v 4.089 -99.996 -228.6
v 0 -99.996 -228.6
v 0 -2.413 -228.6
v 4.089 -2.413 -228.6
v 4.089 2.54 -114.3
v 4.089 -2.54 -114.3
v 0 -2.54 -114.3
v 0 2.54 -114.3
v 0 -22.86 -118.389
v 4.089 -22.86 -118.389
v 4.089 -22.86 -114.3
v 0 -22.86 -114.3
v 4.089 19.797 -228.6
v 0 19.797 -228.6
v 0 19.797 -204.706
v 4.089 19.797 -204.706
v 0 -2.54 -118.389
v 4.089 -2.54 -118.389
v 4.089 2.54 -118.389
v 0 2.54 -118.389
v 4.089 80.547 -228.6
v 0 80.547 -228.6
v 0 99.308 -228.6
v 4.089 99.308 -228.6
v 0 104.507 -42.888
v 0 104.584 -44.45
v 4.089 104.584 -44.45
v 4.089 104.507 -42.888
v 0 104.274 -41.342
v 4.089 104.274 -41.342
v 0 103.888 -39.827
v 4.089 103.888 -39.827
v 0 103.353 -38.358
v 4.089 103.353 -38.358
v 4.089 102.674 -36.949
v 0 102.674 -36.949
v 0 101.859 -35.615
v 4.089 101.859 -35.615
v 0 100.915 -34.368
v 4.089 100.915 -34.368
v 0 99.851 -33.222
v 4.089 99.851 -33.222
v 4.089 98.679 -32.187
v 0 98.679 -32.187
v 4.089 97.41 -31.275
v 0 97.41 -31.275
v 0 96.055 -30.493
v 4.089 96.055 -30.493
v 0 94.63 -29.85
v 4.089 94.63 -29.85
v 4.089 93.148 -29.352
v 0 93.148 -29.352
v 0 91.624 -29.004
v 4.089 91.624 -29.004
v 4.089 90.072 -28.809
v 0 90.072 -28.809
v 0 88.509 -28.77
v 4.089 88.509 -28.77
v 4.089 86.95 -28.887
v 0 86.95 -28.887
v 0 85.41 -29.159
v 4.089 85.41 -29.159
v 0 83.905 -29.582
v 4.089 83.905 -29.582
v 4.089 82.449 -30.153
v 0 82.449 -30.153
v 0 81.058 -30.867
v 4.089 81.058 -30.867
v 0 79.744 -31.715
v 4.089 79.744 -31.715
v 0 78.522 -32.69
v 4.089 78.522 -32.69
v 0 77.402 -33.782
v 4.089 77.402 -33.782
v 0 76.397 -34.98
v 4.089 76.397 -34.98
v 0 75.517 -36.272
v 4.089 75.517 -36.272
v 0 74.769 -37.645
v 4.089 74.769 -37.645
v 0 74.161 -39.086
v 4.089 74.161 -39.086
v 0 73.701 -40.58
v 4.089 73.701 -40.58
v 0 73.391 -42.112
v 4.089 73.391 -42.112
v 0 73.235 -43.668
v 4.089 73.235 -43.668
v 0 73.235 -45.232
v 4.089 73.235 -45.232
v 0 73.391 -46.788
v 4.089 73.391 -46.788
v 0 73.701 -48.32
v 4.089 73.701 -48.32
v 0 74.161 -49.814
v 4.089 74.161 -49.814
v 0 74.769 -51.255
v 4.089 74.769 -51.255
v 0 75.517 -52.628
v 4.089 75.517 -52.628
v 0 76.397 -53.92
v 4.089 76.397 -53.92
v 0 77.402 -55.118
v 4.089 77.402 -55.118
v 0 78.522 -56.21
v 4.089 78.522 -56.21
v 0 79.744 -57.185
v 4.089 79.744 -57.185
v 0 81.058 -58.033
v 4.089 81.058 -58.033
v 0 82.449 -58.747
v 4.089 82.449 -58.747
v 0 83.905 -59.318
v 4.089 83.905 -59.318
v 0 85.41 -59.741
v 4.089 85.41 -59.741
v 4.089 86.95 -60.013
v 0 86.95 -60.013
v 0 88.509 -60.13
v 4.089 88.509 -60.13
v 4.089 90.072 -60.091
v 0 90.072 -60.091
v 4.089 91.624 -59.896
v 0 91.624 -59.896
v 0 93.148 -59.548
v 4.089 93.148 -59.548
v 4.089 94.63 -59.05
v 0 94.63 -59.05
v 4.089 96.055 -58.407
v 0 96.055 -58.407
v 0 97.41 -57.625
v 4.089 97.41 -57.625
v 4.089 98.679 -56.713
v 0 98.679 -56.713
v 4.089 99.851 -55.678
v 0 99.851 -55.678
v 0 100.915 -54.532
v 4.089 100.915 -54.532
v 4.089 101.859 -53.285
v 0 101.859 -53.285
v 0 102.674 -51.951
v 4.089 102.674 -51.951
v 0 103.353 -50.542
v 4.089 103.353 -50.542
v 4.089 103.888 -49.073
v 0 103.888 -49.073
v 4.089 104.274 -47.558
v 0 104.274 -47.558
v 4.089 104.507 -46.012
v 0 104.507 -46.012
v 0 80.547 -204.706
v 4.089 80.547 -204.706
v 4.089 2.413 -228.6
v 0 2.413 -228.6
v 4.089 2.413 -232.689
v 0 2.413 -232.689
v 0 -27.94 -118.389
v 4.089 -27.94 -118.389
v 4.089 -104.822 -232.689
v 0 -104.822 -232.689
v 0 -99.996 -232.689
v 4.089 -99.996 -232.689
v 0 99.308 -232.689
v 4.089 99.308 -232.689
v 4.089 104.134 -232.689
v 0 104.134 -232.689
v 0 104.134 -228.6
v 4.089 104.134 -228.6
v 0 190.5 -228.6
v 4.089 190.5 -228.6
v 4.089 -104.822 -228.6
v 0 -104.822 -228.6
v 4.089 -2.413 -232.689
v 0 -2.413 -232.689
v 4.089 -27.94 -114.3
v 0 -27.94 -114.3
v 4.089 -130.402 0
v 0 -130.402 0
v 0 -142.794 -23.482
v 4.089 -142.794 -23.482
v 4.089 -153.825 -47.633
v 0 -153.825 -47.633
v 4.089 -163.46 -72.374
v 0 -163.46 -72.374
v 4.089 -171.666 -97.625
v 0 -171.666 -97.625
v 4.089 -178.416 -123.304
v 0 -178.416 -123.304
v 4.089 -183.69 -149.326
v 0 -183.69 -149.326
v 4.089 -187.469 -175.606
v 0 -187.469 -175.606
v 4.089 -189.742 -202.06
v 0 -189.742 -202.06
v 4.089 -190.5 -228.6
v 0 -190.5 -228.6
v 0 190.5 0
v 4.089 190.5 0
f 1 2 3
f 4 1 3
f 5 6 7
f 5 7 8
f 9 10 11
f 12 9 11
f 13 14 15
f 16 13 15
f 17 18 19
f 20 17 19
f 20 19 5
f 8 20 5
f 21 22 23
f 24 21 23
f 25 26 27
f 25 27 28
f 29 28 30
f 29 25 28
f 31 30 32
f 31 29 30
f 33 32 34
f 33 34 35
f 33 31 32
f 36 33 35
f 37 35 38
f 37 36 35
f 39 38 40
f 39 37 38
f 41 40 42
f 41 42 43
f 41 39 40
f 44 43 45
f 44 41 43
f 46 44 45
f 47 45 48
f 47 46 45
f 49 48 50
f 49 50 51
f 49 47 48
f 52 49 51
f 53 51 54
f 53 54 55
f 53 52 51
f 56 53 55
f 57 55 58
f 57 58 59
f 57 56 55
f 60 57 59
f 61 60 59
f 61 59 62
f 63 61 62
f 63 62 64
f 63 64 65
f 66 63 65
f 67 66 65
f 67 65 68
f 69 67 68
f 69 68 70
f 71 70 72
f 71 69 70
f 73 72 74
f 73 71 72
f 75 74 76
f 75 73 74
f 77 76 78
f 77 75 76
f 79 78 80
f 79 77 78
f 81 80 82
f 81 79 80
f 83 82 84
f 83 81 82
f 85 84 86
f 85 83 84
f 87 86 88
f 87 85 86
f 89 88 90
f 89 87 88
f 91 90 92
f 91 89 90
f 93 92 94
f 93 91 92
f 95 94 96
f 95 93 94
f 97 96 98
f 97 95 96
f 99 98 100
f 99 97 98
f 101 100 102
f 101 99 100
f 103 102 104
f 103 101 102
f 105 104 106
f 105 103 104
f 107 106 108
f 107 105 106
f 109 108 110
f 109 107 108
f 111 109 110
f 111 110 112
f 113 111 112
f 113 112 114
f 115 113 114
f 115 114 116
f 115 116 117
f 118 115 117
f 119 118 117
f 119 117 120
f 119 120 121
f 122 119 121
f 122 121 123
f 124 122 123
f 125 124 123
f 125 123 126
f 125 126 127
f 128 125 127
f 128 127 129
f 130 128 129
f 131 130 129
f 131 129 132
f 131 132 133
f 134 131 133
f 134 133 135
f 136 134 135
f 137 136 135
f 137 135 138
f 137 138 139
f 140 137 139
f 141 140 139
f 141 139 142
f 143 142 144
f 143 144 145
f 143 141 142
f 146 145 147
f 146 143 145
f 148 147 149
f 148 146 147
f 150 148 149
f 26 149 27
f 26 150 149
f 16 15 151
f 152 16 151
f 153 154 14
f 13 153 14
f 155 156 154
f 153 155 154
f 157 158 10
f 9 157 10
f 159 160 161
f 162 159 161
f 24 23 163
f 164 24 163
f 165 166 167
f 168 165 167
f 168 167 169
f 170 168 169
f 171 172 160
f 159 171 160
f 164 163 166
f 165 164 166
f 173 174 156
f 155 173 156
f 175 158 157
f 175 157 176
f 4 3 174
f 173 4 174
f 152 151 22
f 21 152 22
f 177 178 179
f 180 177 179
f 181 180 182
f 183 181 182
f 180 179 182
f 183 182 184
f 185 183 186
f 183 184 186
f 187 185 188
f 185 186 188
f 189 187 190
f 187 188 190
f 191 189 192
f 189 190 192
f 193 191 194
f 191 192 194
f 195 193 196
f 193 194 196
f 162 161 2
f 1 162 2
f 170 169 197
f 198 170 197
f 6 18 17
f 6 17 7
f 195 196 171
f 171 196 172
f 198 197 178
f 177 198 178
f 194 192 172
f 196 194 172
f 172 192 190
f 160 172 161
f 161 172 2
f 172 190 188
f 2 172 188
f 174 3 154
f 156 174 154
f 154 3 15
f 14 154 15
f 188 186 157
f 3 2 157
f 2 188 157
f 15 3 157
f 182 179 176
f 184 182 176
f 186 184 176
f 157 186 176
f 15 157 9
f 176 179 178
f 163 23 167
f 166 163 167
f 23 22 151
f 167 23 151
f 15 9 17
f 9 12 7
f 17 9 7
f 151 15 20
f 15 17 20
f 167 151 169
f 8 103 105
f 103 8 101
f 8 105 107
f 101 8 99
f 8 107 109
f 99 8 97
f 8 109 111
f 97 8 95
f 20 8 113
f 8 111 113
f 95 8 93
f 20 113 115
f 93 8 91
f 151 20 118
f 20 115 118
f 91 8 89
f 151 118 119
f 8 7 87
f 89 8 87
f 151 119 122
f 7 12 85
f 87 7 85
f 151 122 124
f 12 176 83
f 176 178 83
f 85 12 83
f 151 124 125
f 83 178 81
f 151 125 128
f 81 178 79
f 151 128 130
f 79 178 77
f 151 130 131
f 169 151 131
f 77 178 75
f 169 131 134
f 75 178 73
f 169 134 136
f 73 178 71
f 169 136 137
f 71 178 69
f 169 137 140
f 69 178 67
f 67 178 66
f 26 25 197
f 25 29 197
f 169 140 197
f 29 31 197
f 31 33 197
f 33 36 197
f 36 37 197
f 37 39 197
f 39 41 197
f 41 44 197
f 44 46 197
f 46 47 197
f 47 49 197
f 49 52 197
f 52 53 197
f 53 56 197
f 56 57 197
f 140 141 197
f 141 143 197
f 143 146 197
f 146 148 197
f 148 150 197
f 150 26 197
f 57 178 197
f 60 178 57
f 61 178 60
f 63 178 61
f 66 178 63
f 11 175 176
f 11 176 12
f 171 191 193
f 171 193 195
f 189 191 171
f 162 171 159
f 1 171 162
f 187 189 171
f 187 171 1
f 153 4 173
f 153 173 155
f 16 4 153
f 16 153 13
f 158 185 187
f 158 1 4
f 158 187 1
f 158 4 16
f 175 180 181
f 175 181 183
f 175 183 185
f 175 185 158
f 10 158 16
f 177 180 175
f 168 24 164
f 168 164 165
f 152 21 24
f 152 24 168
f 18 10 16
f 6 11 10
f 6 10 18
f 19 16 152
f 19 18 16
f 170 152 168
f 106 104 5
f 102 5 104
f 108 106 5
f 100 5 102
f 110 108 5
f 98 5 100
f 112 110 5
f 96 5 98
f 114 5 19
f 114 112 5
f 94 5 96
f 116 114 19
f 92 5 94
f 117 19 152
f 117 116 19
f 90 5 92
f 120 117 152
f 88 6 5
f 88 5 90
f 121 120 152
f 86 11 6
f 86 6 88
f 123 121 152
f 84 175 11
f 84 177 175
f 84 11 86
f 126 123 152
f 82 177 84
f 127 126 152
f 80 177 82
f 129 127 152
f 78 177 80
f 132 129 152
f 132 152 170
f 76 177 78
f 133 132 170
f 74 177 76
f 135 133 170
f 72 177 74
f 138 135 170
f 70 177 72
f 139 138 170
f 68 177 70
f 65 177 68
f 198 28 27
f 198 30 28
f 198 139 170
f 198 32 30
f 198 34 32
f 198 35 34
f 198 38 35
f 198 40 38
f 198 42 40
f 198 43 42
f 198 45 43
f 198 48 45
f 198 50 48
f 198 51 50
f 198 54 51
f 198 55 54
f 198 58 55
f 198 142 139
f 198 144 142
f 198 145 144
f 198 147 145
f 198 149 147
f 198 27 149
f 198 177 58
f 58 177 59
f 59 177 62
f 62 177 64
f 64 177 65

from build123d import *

# Parameters (mm, degrees)
F0_R     = 15.6845
F1_DEPTH = 4.0894
F2_W     = 5.08
F2_H     = 4.0894
F3_DEPTH = 25.4


with BuildPart() as f1:
    # F0 (on Right) → F1 (new body)
    with BuildSketch(Plane.YZ):
        with BuildLine():
            Line((104.3824, -228.6), (190.5, -228.6))
            Line((190.5, -228.6), (190.5, 0))
            Line((190.5, 0), (-130.401722, 0))
            ThreePointArc((-130.401722, 0), (-175.224427, -110.416072), (-190.5, -228.6))
            Line((-190.5, -228.6), (-104.821593, -228.6))
            Line((-104.821593, -228.6), (-99.995593, -228.6))
            Line((-99.995593, -228.6), (-2.54, -228.6))
            Line((-2.54, -228.6), (-2.413, -228.6))
            Line((-2.413, -228.6), (2.413, -228.6))
            Line((2.413, -228.6), (2.54, -228.6))
            Line((2.54, -228.6), (19.796586, -228.6))
            Line((19.796586, -228.6), (19.796586, -204.705998))
            Line((19.796586, -204.705998), (80.546886, -204.705998))
            Line((80.546886, -204.705998), (80.546886, -228.6))
            Line((80.546886, -228.6), (99.06, -228.6))
            Line((99.06, -228.6), (99.3082, -228.6))
            Line((99.3082, -228.6), (104.1342, -228.6))
            Line((104.1342, -228.6), (104.3824, -228.6))
        make_face()
        with Locations((88.9, -44.45)):
            Circle(F0_R, mode=Mode.SUBTRACT)
        Polygon((104.1342, -232.6894), (104.1342, -228.6), (99.3082, -228.6), (99.3082, -232.6894), (101.7212, -232.6894), align=None)
        Polygon((-99.995593, -228.6), (-104.821593, -228.6), (-104.821593, -232.6894), (-102.408593, -232.6894), (-99.995593, -232.6894), align=None)
        Polygon((2.413, -228.6), (-2.413, -228.6), (-2.413, -232.6894), (0, -232.6894), (2.413, -232.6894), align=None)
    extrude(amount=F1_DEPTH)

    # F2 (on face) → F3 (cut)
    with BuildSketch(Plane.YZ.offset(4.0894)):
        with Locations((0, -116.3447)):
            Rectangle(F2_W, F2_H)
        with Locations((-25.4, -116.3447)):
            Rectangle(F2_W, F2_H)
    extrude(amount=-F3_DEPTH, mode=Mode.SUBTRACT)


solid = f1.part
